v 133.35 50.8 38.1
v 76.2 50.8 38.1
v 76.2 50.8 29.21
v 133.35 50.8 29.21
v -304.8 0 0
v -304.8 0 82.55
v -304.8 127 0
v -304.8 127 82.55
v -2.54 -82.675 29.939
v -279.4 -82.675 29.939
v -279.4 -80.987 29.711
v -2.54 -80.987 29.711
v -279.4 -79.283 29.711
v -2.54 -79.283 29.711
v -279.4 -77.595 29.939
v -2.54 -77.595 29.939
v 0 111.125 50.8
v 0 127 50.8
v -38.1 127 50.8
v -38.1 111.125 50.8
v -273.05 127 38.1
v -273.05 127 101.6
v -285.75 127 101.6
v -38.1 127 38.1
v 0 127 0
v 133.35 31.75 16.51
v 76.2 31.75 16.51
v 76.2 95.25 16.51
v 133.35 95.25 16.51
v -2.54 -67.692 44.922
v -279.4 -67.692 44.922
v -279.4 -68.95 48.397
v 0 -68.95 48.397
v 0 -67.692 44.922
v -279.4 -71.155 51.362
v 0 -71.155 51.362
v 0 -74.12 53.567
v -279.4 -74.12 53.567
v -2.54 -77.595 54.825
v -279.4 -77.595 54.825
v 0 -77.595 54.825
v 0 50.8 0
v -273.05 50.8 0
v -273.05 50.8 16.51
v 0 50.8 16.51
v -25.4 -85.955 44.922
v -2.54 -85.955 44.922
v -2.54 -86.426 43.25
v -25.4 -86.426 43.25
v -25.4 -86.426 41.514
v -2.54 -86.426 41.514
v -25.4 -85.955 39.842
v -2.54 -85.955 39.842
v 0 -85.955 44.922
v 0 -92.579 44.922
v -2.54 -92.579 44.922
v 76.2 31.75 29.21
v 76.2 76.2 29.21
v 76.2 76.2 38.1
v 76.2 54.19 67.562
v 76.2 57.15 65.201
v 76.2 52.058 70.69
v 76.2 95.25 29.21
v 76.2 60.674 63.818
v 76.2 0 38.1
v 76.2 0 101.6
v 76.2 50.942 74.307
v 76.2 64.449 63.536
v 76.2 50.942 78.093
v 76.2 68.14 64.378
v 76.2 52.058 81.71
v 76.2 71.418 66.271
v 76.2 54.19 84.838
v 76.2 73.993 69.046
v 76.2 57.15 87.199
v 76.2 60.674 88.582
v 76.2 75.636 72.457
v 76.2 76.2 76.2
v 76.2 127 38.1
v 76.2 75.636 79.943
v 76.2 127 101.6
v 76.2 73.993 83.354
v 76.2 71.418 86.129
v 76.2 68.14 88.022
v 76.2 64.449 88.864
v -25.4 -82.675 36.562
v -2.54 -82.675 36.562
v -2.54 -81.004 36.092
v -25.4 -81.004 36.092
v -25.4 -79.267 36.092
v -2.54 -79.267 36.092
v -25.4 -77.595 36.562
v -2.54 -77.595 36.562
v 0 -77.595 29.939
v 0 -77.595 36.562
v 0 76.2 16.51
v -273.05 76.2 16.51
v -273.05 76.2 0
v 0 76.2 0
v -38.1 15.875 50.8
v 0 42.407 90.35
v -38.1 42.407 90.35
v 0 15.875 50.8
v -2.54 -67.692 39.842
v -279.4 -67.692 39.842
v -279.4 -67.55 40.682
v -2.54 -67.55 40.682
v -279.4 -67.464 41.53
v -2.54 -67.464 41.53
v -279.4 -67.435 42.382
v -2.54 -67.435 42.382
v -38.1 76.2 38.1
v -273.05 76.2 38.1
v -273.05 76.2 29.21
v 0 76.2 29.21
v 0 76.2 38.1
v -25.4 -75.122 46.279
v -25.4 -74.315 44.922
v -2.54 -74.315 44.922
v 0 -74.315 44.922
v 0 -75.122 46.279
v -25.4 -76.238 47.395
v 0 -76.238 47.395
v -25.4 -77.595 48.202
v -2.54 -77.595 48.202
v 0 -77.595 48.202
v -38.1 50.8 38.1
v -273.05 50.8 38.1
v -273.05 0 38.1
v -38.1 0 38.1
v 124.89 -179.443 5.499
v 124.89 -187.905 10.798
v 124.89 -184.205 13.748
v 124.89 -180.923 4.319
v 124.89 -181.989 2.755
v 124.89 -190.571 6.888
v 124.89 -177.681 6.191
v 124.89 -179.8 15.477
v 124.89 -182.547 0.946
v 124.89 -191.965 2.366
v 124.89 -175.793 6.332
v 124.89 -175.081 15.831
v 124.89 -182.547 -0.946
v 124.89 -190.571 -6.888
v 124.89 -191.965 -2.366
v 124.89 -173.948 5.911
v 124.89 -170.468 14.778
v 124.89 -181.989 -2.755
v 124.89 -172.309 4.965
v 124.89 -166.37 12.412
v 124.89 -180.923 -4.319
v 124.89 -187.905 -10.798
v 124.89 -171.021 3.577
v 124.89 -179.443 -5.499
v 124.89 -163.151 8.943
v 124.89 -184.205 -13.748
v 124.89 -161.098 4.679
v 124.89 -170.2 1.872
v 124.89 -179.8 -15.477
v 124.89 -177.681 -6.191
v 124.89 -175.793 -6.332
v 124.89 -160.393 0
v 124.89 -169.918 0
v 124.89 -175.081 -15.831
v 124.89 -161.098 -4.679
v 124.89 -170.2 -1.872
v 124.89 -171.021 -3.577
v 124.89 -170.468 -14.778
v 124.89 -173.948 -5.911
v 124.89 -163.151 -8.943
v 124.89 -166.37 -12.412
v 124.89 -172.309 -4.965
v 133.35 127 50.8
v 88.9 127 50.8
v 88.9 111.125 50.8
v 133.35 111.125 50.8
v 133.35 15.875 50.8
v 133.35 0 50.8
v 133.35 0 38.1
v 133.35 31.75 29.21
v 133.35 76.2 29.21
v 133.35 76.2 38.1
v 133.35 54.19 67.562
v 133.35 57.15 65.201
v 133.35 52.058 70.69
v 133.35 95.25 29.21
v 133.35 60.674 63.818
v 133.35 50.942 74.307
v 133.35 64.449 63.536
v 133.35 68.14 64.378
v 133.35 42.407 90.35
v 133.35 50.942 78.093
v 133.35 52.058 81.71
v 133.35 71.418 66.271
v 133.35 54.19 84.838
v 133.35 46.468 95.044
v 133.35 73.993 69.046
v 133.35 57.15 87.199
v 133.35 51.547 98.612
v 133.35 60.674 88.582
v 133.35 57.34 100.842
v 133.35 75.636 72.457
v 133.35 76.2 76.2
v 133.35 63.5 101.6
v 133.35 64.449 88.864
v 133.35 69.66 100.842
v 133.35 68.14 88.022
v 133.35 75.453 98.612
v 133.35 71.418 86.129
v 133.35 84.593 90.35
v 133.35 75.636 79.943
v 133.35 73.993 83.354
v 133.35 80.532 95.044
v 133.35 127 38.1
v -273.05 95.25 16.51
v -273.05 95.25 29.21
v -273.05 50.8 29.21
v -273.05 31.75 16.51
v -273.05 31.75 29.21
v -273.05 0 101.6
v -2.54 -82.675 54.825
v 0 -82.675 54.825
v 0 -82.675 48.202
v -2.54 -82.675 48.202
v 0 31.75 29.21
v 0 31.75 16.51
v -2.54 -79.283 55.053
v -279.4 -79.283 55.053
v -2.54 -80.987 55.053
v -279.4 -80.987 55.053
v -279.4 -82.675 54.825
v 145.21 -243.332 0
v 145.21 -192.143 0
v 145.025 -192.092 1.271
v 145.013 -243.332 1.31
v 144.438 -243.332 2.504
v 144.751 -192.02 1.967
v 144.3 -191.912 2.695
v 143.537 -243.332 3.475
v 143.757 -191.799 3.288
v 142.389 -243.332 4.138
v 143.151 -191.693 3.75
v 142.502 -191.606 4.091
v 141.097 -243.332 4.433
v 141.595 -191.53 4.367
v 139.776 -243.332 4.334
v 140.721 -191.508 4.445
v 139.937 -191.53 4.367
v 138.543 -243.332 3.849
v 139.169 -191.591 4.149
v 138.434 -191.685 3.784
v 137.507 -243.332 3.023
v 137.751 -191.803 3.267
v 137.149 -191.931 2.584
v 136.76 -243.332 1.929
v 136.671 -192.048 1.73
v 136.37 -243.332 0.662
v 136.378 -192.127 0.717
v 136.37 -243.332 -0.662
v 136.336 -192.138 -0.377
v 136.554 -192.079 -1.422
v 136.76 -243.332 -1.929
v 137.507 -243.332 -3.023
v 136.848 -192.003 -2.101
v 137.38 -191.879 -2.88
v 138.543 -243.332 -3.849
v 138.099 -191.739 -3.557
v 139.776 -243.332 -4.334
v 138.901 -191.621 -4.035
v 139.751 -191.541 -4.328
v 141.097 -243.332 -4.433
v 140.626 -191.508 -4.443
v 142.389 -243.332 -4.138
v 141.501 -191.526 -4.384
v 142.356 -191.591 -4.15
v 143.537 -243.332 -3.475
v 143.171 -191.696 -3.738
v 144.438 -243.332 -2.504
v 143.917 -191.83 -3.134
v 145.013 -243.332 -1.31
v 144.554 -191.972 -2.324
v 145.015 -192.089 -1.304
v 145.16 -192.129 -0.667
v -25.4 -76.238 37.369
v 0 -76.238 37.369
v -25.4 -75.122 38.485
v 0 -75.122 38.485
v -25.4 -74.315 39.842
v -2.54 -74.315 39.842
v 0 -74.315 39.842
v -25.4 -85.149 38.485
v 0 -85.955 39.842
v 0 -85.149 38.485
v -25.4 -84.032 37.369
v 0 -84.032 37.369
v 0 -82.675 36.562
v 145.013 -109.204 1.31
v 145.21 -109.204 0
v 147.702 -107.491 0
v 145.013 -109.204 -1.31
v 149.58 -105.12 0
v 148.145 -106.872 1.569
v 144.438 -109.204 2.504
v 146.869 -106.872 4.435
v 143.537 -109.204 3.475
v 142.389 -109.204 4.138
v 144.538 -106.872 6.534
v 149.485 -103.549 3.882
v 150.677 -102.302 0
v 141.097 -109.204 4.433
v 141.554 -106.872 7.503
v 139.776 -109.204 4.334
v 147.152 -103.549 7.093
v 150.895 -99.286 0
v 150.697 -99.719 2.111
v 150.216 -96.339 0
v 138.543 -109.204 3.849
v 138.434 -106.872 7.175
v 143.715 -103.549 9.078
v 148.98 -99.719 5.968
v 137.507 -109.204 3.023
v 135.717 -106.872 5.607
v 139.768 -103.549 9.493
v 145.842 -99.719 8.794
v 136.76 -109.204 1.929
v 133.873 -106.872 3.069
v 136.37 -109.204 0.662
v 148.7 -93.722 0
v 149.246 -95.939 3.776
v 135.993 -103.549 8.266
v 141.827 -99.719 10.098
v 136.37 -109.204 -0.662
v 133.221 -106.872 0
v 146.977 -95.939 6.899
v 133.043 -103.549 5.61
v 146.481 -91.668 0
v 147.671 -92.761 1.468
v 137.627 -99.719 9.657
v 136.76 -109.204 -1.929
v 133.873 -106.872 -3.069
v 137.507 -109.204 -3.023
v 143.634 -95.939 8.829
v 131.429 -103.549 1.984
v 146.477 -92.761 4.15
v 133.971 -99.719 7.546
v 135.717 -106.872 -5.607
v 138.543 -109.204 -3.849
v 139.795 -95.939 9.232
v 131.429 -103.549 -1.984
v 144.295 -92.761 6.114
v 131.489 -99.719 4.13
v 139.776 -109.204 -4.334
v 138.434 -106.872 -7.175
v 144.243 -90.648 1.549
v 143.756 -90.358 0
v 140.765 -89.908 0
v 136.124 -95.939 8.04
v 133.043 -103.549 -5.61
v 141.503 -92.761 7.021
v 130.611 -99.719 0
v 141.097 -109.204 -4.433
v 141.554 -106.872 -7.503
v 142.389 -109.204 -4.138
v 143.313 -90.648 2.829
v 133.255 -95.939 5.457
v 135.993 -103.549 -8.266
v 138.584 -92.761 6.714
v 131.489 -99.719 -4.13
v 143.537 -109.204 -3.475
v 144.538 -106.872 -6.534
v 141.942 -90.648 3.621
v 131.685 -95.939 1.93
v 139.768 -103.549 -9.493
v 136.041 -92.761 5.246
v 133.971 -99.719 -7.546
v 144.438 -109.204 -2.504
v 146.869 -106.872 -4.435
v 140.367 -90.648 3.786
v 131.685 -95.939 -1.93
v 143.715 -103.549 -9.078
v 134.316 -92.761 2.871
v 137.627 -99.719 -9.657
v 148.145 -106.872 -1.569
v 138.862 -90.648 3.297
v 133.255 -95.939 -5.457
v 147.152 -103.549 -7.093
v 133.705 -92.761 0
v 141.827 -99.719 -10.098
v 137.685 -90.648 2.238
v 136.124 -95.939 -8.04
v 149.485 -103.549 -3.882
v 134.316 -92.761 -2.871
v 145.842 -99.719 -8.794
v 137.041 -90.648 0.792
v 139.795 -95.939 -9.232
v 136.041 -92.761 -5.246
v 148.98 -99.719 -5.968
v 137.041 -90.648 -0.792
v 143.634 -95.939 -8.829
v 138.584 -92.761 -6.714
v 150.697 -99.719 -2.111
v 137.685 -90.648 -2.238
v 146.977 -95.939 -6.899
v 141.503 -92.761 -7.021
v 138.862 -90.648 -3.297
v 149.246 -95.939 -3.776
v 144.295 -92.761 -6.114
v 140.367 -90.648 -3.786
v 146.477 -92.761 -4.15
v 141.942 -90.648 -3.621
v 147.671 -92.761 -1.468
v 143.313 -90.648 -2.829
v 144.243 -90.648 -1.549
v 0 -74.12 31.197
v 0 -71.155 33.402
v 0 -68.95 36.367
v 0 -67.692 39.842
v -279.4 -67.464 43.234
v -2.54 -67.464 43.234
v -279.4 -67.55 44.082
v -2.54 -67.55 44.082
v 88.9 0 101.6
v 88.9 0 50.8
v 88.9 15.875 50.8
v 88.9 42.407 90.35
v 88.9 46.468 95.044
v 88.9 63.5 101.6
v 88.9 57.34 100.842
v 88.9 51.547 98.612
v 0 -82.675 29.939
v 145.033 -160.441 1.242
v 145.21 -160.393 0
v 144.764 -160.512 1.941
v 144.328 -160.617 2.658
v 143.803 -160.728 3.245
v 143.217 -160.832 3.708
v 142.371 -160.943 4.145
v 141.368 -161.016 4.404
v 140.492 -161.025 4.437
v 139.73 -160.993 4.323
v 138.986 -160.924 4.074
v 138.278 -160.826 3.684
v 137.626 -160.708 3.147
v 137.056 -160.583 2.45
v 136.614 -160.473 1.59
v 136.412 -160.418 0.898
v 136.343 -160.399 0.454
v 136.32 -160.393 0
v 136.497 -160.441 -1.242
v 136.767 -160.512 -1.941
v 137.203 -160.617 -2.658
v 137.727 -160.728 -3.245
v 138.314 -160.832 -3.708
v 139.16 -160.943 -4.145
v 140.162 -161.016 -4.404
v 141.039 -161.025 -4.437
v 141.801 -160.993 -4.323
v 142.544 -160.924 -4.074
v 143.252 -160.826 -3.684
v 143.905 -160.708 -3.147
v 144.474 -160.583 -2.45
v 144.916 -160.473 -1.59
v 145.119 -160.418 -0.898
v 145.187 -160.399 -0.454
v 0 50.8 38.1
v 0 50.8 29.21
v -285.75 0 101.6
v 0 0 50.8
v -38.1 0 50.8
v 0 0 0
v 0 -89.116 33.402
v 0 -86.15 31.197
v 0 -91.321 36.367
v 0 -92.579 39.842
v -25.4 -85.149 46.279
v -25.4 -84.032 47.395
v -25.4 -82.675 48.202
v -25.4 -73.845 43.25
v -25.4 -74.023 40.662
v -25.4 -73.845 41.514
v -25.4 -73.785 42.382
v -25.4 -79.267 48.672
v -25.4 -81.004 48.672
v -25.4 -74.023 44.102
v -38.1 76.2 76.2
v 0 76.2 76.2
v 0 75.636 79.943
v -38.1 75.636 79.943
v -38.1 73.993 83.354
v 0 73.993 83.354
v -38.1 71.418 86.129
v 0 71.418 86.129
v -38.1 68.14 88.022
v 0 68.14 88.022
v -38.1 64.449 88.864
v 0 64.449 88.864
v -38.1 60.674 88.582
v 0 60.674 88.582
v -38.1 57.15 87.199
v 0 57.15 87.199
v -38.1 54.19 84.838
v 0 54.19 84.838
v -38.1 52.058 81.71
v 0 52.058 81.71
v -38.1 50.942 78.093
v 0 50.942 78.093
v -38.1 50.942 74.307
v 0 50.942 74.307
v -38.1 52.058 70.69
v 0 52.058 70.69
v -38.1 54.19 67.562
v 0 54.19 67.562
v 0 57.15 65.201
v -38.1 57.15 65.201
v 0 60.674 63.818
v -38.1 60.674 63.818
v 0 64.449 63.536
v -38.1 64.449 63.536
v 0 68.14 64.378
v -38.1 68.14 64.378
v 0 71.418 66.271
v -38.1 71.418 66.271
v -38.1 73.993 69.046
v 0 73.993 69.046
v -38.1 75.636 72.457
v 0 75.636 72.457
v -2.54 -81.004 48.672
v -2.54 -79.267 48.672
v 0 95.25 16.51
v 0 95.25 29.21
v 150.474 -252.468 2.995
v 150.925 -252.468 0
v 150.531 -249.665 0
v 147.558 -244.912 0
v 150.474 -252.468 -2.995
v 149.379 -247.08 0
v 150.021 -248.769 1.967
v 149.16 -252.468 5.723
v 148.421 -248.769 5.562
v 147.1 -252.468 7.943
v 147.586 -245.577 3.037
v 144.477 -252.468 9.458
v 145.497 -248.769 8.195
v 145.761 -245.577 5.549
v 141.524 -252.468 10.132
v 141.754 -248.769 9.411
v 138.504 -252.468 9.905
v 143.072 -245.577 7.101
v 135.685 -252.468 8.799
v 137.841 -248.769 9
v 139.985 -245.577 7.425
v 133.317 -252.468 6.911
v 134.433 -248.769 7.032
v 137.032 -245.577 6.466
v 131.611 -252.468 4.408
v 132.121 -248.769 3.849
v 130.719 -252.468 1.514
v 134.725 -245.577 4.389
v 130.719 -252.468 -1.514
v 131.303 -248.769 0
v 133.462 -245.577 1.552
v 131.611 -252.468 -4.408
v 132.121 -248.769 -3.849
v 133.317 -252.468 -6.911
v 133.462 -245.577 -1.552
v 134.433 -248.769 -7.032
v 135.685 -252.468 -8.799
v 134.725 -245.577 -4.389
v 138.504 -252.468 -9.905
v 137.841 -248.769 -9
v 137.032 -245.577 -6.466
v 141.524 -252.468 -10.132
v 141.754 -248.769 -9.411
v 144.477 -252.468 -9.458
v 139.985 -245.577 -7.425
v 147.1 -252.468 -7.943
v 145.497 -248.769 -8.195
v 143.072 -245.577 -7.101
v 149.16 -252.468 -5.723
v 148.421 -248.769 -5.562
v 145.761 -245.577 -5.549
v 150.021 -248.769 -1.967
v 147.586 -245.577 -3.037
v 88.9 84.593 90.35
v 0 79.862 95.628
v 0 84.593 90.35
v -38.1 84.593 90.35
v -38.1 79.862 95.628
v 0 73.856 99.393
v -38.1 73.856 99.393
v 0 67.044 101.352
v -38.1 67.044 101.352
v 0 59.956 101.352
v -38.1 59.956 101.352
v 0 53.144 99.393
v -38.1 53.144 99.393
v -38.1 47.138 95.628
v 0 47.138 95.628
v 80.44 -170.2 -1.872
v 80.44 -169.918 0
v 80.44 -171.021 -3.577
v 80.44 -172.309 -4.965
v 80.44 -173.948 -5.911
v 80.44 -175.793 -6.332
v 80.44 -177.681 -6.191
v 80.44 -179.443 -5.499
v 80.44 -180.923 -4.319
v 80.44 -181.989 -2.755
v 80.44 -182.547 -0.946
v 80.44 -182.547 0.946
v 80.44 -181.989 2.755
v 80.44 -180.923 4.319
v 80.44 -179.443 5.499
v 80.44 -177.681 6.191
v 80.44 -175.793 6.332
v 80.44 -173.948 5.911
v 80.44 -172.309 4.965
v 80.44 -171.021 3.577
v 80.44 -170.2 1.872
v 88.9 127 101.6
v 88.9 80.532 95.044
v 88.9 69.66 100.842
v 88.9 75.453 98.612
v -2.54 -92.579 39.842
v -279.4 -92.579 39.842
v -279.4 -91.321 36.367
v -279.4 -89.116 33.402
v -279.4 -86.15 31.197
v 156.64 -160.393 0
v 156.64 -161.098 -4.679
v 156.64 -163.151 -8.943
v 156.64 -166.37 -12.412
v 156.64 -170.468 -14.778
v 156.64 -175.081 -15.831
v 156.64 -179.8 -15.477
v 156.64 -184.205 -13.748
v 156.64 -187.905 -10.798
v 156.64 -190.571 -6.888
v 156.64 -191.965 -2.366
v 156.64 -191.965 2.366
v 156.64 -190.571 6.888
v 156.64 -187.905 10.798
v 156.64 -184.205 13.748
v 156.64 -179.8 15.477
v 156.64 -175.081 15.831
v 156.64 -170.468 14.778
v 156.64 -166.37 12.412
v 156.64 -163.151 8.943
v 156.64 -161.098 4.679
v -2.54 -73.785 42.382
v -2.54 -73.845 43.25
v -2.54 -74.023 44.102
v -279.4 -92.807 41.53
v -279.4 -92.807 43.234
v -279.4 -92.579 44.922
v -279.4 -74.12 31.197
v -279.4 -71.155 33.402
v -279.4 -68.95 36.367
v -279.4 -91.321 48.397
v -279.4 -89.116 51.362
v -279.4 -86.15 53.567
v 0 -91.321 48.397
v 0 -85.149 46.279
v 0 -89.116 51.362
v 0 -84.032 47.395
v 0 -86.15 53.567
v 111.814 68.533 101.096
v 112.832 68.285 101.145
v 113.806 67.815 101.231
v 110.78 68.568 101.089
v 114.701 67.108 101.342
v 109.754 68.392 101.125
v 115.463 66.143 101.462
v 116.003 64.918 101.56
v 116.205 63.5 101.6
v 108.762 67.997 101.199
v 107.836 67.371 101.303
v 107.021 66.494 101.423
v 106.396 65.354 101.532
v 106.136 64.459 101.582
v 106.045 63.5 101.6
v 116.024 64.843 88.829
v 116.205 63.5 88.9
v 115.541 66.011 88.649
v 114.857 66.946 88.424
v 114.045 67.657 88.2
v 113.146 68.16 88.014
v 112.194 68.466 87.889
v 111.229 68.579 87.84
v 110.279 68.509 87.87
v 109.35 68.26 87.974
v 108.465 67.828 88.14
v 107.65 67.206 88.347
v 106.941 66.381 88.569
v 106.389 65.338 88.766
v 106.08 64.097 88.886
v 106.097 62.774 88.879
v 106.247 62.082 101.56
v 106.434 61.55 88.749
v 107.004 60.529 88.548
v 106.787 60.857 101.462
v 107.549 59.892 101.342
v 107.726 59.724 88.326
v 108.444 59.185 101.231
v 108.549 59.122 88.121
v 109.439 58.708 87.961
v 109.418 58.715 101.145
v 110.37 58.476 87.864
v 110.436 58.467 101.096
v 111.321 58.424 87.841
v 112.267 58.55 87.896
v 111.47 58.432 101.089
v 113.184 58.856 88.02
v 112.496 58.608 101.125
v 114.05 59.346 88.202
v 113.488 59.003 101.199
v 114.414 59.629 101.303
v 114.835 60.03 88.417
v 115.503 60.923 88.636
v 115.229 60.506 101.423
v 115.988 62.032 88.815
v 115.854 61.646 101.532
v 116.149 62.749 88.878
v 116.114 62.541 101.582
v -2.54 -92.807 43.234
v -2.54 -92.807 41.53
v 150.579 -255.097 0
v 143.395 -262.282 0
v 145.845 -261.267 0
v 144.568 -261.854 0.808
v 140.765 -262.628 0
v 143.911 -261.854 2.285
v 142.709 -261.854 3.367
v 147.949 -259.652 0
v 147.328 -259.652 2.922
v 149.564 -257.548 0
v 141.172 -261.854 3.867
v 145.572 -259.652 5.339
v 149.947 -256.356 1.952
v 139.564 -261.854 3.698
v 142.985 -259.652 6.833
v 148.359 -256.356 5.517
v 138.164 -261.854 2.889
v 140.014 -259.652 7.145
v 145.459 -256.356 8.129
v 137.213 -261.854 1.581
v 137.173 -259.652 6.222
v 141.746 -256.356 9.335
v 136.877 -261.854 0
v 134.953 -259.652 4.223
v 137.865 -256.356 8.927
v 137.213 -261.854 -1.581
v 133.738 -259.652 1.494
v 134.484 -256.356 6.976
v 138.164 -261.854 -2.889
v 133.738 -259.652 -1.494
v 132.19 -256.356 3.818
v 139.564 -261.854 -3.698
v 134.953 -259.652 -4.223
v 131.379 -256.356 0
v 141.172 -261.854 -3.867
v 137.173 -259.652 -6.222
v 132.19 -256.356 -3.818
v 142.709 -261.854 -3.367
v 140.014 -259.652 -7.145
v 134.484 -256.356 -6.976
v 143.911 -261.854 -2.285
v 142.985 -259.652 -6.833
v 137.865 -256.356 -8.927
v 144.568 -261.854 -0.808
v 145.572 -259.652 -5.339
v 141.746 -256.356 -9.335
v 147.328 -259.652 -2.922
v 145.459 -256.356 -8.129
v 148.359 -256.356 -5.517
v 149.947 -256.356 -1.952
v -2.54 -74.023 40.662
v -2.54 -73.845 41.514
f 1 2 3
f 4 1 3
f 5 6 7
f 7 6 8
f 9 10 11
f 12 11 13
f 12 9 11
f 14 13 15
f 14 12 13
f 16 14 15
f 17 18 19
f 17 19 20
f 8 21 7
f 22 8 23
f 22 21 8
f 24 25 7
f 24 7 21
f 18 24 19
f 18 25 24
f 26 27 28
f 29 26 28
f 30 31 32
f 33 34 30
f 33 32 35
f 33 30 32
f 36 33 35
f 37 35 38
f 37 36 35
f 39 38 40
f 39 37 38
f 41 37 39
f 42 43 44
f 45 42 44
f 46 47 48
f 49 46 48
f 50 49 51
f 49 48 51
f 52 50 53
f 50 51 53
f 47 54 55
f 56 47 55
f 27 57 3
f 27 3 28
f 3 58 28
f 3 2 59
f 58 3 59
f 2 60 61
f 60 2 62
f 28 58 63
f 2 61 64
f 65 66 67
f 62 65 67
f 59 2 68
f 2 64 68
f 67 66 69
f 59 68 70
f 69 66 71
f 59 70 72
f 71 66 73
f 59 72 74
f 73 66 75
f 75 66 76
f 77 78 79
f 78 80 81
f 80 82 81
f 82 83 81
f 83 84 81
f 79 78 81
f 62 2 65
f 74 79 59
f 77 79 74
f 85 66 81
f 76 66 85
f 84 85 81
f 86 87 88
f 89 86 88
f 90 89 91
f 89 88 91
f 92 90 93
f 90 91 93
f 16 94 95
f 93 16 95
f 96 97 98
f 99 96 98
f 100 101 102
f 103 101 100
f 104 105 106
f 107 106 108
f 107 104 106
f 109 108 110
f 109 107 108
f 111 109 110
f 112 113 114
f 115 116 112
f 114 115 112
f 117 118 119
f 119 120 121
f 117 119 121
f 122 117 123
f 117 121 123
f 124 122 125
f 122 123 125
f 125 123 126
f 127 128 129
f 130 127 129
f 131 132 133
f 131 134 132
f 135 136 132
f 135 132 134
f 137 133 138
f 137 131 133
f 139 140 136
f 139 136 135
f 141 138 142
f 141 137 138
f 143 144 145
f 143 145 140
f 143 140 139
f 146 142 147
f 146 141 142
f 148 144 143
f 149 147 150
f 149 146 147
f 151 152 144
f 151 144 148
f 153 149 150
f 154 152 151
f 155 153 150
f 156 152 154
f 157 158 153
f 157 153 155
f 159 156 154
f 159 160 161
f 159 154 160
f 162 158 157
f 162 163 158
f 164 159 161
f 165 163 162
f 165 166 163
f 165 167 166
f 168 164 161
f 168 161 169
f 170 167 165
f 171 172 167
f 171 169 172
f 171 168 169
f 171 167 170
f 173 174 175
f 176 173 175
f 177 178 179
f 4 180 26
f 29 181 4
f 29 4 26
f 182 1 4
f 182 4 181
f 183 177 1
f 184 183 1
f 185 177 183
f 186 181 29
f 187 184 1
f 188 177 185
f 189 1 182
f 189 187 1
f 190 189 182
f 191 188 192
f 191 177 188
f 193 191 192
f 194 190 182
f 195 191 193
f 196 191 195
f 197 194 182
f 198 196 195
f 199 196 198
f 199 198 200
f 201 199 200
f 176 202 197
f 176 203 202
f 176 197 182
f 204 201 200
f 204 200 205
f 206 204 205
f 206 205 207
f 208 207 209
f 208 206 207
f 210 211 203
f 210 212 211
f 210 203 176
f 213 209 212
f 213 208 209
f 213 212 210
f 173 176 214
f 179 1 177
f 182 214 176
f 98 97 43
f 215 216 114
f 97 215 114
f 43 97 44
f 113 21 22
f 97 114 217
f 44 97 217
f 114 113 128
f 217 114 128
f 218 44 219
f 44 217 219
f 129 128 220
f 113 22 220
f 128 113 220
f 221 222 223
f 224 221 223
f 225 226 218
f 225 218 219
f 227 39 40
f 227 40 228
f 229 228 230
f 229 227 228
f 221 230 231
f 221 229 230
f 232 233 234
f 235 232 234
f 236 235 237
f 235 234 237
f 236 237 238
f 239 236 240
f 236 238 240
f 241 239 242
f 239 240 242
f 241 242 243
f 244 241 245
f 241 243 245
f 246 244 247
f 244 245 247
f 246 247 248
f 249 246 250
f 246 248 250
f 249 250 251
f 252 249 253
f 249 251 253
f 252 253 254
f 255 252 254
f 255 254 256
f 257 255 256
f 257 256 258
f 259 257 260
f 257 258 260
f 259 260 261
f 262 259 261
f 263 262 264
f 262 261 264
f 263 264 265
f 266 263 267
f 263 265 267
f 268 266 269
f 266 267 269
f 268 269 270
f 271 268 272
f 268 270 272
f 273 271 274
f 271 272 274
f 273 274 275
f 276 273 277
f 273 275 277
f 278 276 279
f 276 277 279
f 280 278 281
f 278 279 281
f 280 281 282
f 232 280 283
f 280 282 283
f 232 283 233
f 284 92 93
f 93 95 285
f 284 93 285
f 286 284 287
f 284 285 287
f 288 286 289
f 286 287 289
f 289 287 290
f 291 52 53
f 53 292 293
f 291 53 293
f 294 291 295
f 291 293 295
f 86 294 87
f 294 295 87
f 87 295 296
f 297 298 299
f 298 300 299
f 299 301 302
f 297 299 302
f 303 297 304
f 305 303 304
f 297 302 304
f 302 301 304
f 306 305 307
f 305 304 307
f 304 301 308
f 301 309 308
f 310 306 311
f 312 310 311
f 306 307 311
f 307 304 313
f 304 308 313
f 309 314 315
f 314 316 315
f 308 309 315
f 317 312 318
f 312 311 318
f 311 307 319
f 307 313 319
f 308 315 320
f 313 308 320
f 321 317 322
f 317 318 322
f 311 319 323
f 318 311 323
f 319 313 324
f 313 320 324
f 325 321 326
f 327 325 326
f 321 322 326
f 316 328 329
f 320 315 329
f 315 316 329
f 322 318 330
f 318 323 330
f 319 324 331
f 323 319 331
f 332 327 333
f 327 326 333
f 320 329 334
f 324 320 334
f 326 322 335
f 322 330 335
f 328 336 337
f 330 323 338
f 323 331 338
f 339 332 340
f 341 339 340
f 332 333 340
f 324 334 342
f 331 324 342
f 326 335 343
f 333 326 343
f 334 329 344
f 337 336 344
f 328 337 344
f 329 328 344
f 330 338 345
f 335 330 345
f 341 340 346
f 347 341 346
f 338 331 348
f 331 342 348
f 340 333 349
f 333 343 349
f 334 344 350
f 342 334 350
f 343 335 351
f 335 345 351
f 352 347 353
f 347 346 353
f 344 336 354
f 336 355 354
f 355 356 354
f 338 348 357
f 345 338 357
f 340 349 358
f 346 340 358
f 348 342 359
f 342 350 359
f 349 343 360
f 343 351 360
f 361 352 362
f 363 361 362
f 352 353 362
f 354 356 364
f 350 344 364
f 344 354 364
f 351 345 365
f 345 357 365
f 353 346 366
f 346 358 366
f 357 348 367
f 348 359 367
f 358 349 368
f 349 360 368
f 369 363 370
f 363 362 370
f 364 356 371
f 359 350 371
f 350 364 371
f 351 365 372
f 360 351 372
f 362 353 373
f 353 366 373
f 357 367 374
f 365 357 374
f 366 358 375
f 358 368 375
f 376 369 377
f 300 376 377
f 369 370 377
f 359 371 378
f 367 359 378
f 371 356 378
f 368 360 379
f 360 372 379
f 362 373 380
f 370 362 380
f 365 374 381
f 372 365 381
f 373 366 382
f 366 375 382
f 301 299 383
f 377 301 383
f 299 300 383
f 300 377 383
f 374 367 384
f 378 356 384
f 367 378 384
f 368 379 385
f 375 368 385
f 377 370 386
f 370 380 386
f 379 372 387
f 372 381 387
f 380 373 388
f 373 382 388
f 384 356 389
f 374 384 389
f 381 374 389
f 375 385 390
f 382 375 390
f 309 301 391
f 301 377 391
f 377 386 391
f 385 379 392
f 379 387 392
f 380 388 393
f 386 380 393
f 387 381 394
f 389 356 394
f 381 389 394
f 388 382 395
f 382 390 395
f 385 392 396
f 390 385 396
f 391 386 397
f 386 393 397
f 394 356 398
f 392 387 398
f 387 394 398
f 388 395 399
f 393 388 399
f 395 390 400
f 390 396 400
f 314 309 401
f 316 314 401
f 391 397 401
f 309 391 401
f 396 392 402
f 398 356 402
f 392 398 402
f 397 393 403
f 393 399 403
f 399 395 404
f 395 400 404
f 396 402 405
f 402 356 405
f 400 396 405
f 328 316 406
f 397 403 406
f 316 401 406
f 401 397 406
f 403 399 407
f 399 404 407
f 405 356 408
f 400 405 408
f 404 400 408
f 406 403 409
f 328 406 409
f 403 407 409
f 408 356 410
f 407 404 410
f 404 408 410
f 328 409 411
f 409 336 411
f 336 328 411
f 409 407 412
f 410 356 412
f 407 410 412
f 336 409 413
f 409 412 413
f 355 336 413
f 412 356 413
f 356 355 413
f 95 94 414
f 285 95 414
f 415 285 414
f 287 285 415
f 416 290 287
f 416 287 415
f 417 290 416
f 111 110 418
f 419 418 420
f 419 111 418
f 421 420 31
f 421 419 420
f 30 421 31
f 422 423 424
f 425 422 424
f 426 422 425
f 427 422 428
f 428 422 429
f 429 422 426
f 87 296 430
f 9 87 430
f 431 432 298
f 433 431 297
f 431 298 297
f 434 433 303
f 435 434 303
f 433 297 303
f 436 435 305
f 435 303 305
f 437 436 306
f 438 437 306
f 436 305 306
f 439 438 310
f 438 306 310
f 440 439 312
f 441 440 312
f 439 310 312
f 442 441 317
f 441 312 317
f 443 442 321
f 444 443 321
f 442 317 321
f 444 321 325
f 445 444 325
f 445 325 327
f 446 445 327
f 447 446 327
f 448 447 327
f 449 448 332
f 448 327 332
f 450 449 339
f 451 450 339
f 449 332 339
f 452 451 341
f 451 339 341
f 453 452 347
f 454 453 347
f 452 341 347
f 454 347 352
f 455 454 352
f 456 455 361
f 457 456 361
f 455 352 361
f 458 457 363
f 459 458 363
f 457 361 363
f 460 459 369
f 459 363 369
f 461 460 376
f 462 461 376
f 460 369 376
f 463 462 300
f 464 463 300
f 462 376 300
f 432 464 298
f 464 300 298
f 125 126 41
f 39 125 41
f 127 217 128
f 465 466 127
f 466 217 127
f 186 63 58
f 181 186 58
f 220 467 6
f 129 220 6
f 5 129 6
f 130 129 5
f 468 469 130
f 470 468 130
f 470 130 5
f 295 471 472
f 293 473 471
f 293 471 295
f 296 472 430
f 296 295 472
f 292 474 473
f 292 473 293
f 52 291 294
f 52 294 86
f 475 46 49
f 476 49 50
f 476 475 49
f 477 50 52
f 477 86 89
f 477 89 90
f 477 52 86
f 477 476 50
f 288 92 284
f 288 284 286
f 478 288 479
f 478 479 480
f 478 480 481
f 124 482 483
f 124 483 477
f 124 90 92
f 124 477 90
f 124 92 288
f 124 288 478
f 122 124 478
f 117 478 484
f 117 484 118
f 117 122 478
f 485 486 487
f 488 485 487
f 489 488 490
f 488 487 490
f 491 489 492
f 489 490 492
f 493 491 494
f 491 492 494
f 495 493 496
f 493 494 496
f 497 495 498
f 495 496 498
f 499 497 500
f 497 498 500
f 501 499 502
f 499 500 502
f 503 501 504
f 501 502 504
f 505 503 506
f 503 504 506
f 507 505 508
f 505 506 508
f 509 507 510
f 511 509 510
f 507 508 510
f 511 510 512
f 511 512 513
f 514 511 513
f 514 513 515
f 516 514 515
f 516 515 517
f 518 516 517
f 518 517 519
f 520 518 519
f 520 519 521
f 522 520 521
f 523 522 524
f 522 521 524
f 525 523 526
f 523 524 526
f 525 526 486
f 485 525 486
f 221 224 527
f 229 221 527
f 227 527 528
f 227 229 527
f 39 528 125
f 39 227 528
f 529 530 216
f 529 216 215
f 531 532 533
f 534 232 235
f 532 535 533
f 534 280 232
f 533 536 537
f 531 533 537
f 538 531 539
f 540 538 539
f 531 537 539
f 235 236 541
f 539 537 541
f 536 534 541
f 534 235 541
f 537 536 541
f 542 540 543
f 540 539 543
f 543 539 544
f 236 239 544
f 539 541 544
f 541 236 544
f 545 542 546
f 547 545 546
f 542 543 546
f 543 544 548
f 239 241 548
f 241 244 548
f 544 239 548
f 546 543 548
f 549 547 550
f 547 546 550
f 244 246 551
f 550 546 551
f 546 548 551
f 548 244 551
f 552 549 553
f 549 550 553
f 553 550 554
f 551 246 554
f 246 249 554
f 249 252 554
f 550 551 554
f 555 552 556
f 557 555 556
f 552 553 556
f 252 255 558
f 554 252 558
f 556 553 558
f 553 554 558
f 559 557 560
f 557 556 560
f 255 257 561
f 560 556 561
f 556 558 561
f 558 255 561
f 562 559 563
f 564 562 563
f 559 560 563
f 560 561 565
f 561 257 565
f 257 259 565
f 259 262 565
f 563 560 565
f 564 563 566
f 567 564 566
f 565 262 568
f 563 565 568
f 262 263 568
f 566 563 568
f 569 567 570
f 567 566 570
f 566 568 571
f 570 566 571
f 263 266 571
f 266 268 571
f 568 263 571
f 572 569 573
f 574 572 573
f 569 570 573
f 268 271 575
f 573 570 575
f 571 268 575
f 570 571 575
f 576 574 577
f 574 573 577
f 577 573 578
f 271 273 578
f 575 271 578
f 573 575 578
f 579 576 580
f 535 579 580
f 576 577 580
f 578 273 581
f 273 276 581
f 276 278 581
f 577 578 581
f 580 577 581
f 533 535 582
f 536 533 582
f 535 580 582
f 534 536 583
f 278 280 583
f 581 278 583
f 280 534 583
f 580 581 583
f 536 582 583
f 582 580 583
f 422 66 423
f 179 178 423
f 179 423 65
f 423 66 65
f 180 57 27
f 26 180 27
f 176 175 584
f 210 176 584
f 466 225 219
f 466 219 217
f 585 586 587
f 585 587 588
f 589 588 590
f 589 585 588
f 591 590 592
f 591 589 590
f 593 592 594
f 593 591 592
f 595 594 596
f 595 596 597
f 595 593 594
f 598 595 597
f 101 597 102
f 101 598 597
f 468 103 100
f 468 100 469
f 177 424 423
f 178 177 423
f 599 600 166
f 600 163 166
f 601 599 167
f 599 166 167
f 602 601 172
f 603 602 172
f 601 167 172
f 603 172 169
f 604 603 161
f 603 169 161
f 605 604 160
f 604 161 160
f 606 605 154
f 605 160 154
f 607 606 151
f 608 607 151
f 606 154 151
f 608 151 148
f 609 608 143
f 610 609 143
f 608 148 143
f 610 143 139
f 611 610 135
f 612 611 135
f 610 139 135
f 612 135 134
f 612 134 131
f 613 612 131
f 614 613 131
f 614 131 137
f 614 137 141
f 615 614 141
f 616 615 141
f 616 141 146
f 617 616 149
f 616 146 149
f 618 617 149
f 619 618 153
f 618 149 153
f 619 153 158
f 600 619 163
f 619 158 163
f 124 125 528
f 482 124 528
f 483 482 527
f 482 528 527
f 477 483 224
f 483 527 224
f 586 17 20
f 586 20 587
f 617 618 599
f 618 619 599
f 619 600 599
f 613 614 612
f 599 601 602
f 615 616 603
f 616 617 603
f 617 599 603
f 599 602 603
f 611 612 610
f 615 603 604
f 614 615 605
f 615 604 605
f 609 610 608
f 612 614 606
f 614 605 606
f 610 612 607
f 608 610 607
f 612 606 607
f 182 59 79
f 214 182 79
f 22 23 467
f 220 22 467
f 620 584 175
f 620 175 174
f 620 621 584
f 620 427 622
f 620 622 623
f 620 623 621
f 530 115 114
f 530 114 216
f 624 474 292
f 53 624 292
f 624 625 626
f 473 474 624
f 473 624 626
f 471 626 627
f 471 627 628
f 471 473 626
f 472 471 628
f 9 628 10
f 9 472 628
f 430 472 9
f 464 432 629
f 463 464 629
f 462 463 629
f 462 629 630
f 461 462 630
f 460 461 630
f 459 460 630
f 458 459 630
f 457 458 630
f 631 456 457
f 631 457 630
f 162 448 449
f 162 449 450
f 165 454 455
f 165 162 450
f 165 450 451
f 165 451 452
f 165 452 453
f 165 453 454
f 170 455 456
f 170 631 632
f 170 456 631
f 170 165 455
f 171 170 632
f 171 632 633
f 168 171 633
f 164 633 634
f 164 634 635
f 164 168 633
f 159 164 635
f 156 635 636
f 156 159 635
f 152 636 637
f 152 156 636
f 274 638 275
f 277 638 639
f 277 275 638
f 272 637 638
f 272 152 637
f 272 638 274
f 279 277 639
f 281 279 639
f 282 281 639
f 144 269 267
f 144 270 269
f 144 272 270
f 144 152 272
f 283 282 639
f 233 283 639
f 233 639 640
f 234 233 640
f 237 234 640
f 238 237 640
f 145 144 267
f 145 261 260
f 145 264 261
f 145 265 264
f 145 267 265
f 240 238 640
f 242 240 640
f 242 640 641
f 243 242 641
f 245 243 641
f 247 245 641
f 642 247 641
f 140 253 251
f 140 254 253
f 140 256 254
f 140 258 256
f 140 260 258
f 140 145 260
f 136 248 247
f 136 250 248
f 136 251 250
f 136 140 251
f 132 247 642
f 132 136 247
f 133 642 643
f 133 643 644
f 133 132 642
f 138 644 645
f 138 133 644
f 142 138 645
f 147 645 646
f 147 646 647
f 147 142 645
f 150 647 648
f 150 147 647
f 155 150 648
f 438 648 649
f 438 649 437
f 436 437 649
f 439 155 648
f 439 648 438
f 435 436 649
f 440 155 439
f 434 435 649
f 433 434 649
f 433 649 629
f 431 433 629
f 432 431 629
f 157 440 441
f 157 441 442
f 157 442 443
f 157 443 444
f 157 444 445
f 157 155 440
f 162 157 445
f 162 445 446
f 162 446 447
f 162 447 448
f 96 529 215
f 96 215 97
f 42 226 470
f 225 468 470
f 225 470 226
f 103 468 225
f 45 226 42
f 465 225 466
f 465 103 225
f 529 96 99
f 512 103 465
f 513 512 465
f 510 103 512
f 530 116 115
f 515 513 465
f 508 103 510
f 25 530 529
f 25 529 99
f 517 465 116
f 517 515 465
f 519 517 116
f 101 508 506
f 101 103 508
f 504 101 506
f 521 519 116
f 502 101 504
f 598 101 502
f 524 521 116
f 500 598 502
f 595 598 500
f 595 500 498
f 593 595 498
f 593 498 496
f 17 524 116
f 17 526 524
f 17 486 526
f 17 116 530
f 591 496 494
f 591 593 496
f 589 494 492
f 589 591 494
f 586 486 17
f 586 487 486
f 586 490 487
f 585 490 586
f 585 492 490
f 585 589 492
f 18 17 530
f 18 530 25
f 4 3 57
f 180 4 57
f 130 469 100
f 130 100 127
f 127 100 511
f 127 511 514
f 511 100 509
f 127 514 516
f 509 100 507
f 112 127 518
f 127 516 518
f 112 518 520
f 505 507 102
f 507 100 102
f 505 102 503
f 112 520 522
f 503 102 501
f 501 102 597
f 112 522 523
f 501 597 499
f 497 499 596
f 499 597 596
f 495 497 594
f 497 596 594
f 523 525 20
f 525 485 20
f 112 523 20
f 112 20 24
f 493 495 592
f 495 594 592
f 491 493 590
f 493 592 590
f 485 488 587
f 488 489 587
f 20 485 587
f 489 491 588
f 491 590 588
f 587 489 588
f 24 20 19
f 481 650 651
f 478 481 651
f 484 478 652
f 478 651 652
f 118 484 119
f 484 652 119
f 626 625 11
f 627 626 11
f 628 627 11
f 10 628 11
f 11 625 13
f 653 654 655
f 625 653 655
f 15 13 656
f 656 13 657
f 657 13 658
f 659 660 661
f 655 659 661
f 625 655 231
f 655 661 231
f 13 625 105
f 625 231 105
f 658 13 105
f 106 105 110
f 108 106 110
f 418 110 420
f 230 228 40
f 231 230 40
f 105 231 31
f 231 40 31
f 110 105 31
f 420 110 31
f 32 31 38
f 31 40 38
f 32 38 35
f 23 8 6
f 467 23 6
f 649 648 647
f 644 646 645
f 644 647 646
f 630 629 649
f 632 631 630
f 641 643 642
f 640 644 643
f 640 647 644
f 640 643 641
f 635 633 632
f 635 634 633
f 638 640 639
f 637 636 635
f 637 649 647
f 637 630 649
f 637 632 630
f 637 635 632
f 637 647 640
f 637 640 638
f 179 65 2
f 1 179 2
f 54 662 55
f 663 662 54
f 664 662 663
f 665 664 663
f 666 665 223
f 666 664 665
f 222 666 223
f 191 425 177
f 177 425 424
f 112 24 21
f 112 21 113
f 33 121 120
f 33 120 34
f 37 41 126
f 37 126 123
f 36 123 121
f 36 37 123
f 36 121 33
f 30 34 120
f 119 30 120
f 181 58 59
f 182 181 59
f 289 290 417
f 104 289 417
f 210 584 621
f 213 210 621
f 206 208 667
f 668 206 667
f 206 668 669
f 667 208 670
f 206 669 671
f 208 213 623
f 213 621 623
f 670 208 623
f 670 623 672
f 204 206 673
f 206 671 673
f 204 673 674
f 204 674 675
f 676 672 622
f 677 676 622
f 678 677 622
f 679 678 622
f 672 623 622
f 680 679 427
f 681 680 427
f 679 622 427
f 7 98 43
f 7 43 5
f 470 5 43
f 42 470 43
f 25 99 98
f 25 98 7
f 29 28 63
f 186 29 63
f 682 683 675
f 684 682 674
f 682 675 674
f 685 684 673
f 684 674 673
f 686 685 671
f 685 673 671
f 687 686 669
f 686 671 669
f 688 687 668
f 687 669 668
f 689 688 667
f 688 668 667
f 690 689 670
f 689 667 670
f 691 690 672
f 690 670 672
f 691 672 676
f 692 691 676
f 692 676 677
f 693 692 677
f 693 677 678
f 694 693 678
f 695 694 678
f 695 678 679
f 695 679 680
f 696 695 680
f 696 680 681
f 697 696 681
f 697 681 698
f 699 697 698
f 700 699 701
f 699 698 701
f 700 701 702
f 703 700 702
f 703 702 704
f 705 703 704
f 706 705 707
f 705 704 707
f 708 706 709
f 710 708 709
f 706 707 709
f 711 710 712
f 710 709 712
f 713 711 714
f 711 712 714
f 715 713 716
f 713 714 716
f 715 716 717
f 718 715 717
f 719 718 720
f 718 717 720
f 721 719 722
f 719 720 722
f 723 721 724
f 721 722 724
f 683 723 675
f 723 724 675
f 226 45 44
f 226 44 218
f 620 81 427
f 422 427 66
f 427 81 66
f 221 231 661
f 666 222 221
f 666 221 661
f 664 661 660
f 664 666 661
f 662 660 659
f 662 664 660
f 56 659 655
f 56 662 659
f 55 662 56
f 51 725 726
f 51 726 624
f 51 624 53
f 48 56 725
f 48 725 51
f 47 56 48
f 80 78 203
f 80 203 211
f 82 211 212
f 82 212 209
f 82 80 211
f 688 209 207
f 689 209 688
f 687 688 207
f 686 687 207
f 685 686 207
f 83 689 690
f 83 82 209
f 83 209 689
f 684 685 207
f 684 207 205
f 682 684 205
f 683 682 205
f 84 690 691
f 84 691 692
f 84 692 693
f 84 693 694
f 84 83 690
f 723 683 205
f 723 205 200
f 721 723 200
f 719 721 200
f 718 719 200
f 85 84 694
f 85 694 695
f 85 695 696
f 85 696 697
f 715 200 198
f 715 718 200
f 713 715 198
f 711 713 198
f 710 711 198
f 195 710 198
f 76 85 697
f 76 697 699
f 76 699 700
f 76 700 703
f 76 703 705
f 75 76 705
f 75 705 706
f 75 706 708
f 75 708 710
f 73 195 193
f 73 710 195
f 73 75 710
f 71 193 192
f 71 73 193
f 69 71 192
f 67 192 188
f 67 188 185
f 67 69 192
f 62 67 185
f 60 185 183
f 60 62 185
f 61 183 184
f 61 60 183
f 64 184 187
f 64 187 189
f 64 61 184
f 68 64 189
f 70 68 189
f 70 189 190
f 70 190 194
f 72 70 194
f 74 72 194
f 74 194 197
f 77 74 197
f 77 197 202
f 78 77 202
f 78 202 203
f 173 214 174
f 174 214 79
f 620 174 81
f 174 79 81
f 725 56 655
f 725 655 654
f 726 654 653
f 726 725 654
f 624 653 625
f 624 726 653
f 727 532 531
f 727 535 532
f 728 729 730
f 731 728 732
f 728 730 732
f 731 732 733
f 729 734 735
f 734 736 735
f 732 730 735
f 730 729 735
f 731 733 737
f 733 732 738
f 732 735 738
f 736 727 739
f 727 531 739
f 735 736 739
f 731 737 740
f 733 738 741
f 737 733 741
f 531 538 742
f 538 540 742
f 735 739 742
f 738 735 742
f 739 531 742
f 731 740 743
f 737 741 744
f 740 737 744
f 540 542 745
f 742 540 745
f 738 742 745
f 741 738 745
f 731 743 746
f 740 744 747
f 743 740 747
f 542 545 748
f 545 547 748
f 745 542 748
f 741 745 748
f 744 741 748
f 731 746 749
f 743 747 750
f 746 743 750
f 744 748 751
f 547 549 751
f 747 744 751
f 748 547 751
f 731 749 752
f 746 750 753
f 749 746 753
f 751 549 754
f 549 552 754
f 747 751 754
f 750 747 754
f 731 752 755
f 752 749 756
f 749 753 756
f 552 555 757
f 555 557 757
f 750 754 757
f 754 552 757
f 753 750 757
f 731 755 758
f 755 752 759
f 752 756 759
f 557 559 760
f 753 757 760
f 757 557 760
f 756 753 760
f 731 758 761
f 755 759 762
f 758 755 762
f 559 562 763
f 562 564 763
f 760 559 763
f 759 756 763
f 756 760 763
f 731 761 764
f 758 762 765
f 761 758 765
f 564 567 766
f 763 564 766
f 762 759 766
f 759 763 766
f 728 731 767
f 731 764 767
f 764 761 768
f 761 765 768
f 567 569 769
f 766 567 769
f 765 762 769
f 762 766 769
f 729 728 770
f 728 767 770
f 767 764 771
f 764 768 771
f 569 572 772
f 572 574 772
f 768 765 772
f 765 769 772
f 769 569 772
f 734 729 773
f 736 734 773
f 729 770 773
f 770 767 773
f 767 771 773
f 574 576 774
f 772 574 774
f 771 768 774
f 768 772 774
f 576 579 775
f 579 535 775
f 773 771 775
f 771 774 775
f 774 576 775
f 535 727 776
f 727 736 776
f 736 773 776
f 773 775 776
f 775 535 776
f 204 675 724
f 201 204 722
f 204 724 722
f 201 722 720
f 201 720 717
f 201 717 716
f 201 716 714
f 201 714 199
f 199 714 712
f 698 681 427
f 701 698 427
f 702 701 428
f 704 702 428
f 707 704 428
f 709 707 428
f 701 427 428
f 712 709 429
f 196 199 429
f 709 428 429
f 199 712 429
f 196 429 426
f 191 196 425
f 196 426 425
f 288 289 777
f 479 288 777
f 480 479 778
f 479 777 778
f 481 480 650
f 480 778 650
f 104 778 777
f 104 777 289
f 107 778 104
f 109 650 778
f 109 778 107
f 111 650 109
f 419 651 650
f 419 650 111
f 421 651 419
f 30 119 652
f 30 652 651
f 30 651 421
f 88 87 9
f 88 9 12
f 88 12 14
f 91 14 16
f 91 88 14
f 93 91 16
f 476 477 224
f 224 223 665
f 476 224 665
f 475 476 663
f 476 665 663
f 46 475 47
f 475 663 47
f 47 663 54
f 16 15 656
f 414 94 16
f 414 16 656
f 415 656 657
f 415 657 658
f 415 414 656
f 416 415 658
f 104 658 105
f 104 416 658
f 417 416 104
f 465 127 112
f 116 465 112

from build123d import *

# Parameters (mm, degrees)
F0_R      = 12.7
F1_DEPTH  = 38.1
F2_DEPTH  = 304.8
F3_W      = 127
F3_H      = 101.6
F4_DEPTH  = 31.75
F5_SIZE2  = 19.05
F5_SIZE   = 19.05
F7_R      = 12.7
F8_DEPTH  = 57.15
F9_DEPTH  = 12.7
F10_R     = 5.08
F11_DEPTH = 14.7602578338
F13_DEPTH = 279.4
F14_DEPTH = 25.4
F15_DEPTH = 2.54
F16_W     = 4.445
F16_H     = 15.875
F16_W_2   = 11.43
F16_W_3   = 44.45
F16_H_2   = 6.35


with BuildPart() as f1:
    # F0 (on Right) → F1 (new body)
    with BuildSketch(Plane.YZ):
        Polygon((0, 38.1), (0, 0), (50.8, 0), (50.8, 16.51), (31.75, 16.51), (31.75, 29.21), (50.8, 29.21), (50.8, 38.1), align=None)
        Polygon((76.2, 16.51), (76.2, 0), (127, 0), (127, 38.1), (76.2, 38.1), (76.2, 29.21), (95.25, 29.21), (95.25, 16.51), align=None)
        with BuildLine():
            Line((42.4065743945, 90.3501730104), (15.875, 50.8))
            Line((15.875, 50.8), (111.125, 50.8))
            Line((111.125, 50.8), (84.5934256055, 90.3501730104))
            ThreePointArc((84.5934256055, 90.3501730104), (63.5, 101.6), (42.4065743945, 90.3501730104))
        make_face()
        with Locations((63.5, 76.2)):
            Circle(F0_R, mode=Mode.SUBTRACT)
        Polygon((0, 50.8), (0, 38.1), (50.8, 38.1), (76.2, 38.1), (127, 38.1), (127, 50.8), (111.125, 50.8), (15.875, 50.8), align=None)
    extrude(amount=-F1_DEPTH)

    # F0 (on Right) → F2 (join)
    with BuildSketch(Plane.YZ):
        Polygon((76.2, 16.51), (76.2, 0), (127, 0), (127, 38.1), (76.2, 38.1), (76.2, 29.21), (95.25, 29.21), (95.25, 16.51), align=None)
        Polygon((0, 38.1), (0, 0), (50.8, 0), (50.8, 16.51), (31.75, 16.51), (31.75, 29.21), (50.8, 29.21), (50.8, 38.1), align=None)
    extrude(amount=-F2_DEPTH)

    # F3 (on face) → F4 (join)
    with BuildSketch(Plane(origin=(-304.8, 0, 0), x_dir=(0, -1, 0), z_dir=(-1, 0, 0))):
        with Locations((-63.5, 50.8)):
            Rectangle(F3_W, F3_H)
    extrude(amount=-F4_DEPTH)

    # F5
    f5_edges = [f1.edges().sort_by_distance(p)[0] for p in [
        (-304.8, 63.5, 101.6),
    ]]
    chamfer(f5_edges, length=F5_SIZE, length2=F5_SIZE2)


with BuildPart() as f8:
    # F7 (on offset) → F8 (new body)
    with BuildSketch(Plane.YZ.offset(76.2)):
        Polygon((111.125, 50.8), (15.875, 50.8), (0, 50.8), (0, 38.1), (50.8, 38.1), (76.2, 38.1), (127, 38.1), (127, 50.8), align=None)
        with BuildLine():
            Line((42.4065743945, 90.3501730104), (15.875, 50.8))
            Line((15.875, 50.8), (111.125, 50.8))
            Line((111.125, 50.8), (84.5934256055, 90.3501730104))
            ThreePointArc((84.5934256055, 90.3501730104), (75.4529411765, 98.6117647059), (63.5, 101.6))
            ThreePointArc((63.5, 101.6), (51.5470588235, 98.6117647059), (42.4065743945, 90.3501730104))
        make_face()
        with Locations((63.5, 76.2)):
            Circle(F7_R, mode=Mode.SUBTRACT)
        Polygon((76.2, 38.1), (50.8, 38.1), (50.8, 29.21), (31.75, 29.21), (31.75, 16.51), (50.8, 16.51), (76.2, 16.51), (95.25, 16.51), (95.25, 29.21), (76.2, 29.21), align=None)
    extrude(amount=F8_DEPTH)

    # F7 (on offset) → F9 (join)
    with BuildSketch(Plane.YZ.offset(76.2)):
        with BuildLine():
            Line((0, 50.8), (15.875, 50.8))
            Line((15.875, 50.8), (42.4065743945, 90.3501730104))
            ThreePointArc((42.4065743945, 90.3501730104), (51.5470588235, 98.6117647059), (63.5, 101.6))
            Line((63.5, 101.6), (0, 101.6))
            Line((0, 101.6), (0, 50.8))
        make_face()
        with BuildLine():
            Line((84.5934256055, 90.3501730104), (111.125, 50.8))
            Line((111.125, 50.8), (127, 50.8))
            Line((127, 50.8), (127, 101.6))
            Line((127, 101.6), (63.5, 101.6))
            ThreePointArc((63.5, 101.6), (75.4529411765, 98.6117647059), (84.5934256055, 90.3501730104))
        make_face()
    extrude(amount=F9_DEPTH)

    # F10 (on face) → F11 (cut, up to face)
    with BuildSketch(Plane.XY.offset(101.6)):
        with Locations((111.125, 63.5)):
            Circle(F10_R)
    extrude(amount=-F11_DEPTH, mode=Mode.SUBTRACT)


with BuildPart() as f13:
    # F12 (on Right) → F13 (new body)
    with BuildSketch(Plane.YZ):
        with BuildLine():
            ThreePointArc((-74.31538743, 44.9220035141), (-73.9192034755, 43.6793697515), (-73.7852585626, 42.3820035141))
            ThreePointArc((-73.7852585626, 42.3820035141), (-73.9192034755, 41.0846372766), (-74.31538743, 39.8420035141))
            Line((-74.31538743, 39.8420035141), (-67.6918506693, 39.8420035141))
            ThreePointArc((-67.6918506693, 39.8420035141), (-67.4995694194, 41.1055396966), (-67.4352585626, 42.3820035141))
            ThreePointArc((-67.4352585626, 42.3820035141), (-67.4995694194, 43.6584673315), (-67.6918506693, 44.9220035141))
            Line((-67.6918506693, 44.9220035141), (-74.31538743, 44.9220035141))
        make_face()
        with BuildLine():
            ThreePointArc((-77.5952585626, 48.2018746466), (-75.6451305021, 46.8721315746), (-74.31538743, 44.9220035141))
            Line((-74.31538743, 44.9220035141), (-67.6918506693, 44.9220035141))
            ThreePointArc((-67.6918506693, 44.9220035141), (-71.1550024415, 51.3622596351), (-77.5952585626, 54.8254114074))
            Line((-77.5952585626, 54.8254114074), (-77.5952585626, 48.2018746466))
        make_face()
        with BuildLine():
            Line((-67.6918506693, 39.8420035141), (-74.31538743, 39.8420035141))
            ThreePointArc((-74.31538743, 39.8420035141), (-75.6451305021, 37.8918754535), (-77.5952585626, 36.5621323815))
            Line((-77.5952585626, 36.5621323815), (-77.5952585626, 29.9385956207))
            ThreePointArc((-77.5952585626, 29.9385956207), (-71.1550024415, 33.401747393), (-67.6918506693, 39.8420035141))
        make_face()
        with BuildLine():
            ThreePointArc((-82.6752585626, 48.2018746466), (-80.1352585626, 48.7320035141), (-77.5952585626, 48.2018746466))
            Line((-77.5952585626, 48.2018746466), (-77.5952585626, 54.8254114074))
            ThreePointArc((-77.5952585626, 54.8254114074), (-80.1352585626, 55.0820035141), (-82.6752585626, 54.8254114074))
            Line((-82.6752585626, 54.8254114074), (-82.6752585626, 48.2018746466))
        make_face()
        with BuildLine():
            Line((-77.5952585626, 29.9385956207), (-77.5952585626, 36.5621323815))
            ThreePointArc((-77.5952585626, 36.5621323815), (-80.1352585626, 36.0320035141), (-82.6752585626, 36.5621323815))
            Line((-82.6752585626, 36.5621323815), (-82.6752585626, 29.9385956207))
            ThreePointArc((-82.6752585626, 29.9385956207), (-80.1352585626, 29.6820035141), (-77.5952585626, 29.9385956207))
        make_face()
        with BuildLine():
            ThreePointArc((-85.9551296952, 44.9220035141), (-84.6253866231, 46.8721315746), (-82.6752585626, 48.2018746466))
            Line((-82.6752585626, 48.2018746466), (-82.6752585626, 54.8254114074))
            ThreePointArc((-82.6752585626, 54.8254114074), (-89.1155146837, 51.3622596351), (-92.5786664559, 44.9220035141))
            Line((-92.5786664559, 44.9220035141), (-85.9551296952, 44.9220035141))
        make_face()
        with BuildLine():
            Line((-82.6752585626, 29.9385956207), (-82.6752585626, 36.5621323815))
            ThreePointArc((-82.6752585626, 36.5621323815), (-84.6253866231, 37.8918754535), (-85.9551296952, 39.8420035141))
            Line((-85.9551296952, 39.8420035141), (-92.5786664559, 39.8420035141))
            ThreePointArc((-92.5786664559, 39.8420035141), (-89.1155146837, 33.401747393), (-82.6752585626, 29.9385956207))
        make_face()
        with BuildLine():
            ThreePointArc((-85.9551296952, 39.8420035141), (-86.4852585626, 42.3820035141), (-85.9551296952, 44.9220035141))
            Line((-85.9551296952, 44.9220035141), (-92.5786664559, 44.9220035141))
            ThreePointArc((-92.5786664559, 44.9220035141), (-92.8352585626, 42.3820035141), (-92.5786664559, 39.8420035141))
            Line((-92.5786664559, 39.8420035141), (-85.9551296952, 39.8420035141))
        make_face()
        with BuildLine():
            ThreePointArc((-74.31538743, 39.8420035141), (-73.9192034755, 41.0846372766), (-73.7852585626, 42.3820035141))
            ThreePointArc((-73.7852585626, 42.3820035141), (-73.9192034755, 43.6793697515), (-74.31538743, 44.9220035141))
            ThreePointArc((-74.31538743, 44.9220035141), (-75.6451305021, 46.8721315746), (-77.5952585626, 48.2018746466))
            ThreePointArc((-77.5952585626, 48.2018746466), (-80.1352585626, 48.7320035141), (-82.6752585626, 48.2018746466))
            ThreePointArc((-82.6752585626, 48.2018746466), (-84.6253866231, 46.8721315746), (-85.9551296952, 44.9220035141))
            ThreePointArc((-85.9551296952, 44.9220035141), (-86.4852585626, 42.3820035141), (-85.9551296952, 39.8420035141))
            ThreePointArc((-85.9551296952, 39.8420035141), (-84.6253866231, 37.8918754535), (-82.6752585626, 36.5621323815))
            ThreePointArc((-82.6752585626, 36.5621323815), (-80.1352585626, 36.0320035141), (-77.5952585626, 36.5621323815))
            ThreePointArc((-77.5952585626, 36.5621323815), (-75.6451305021, 37.8918754535), (-74.31538743, 39.8420035141))
        make_face()
    extrude(amount=-F13_DEPTH)

    # F12 (on Right) → F14 (cut)
    with BuildSketch(Plane.YZ):
        with BuildLine():
            ThreePointArc((-74.31538743, 39.8420035141), (-73.9192034755, 41.0846372766), (-73.7852585626, 42.3820035141))
            ThreePointArc((-73.7852585626, 42.3820035141), (-73.9192034755, 43.6793697515), (-74.31538743, 44.9220035141))
            ThreePointArc((-74.31538743, 44.9220035141), (-75.6451305021, 46.8721315746), (-77.5952585626, 48.2018746466))
            ThreePointArc((-77.5952585626, 48.2018746466), (-80.1352585626, 48.7320035141), (-82.6752585626, 48.2018746466))
            ThreePointArc((-82.6752585626, 48.2018746466), (-84.6253866231, 46.8721315746), (-85.9551296952, 44.9220035141))
            ThreePointArc((-85.9551296952, 44.9220035141), (-86.4852585626, 42.3820035141), (-85.9551296952, 39.8420035141))
            ThreePointArc((-85.9551296952, 39.8420035141), (-84.6253866231, 37.8918754535), (-82.6752585626, 36.5621323815))
            ThreePointArc((-82.6752585626, 36.5621323815), (-80.1352585626, 36.0320035141), (-77.5952585626, 36.5621323815))
            ThreePointArc((-77.5952585626, 36.5621323815), (-75.6451305021, 37.8918754535), (-74.31538743, 39.8420035141))
        make_face()
    extrude(amount=-F14_DEPTH, mode=Mode.SUBTRACT)

    # F12 (on Right) → F15 (cut)
    with BuildSketch(Plane.YZ):
        with BuildLine():
            ThreePointArc((-82.6752585626, 48.2018746466), (-80.1352585626, 48.7320035141), (-77.5952585626, 48.2018746466))
            Line((-77.5952585626, 48.2018746466), (-77.5952585626, 54.8254114074))
            ThreePointArc((-77.5952585626, 54.8254114074), (-80.1352585626, 55.0820035141), (-82.6752585626, 54.8254114074))
            Line((-82.6752585626, 54.8254114074), (-82.6752585626, 48.2018746466))
        make_face()
        with BuildLine():
            ThreePointArc((-74.31538743, 44.9220035141), (-73.9192034755, 43.6793697515), (-73.7852585626, 42.3820035141))
            ThreePointArc((-73.7852585626, 42.3820035141), (-73.9192034755, 41.0846372766), (-74.31538743, 39.8420035141))
            Line((-74.31538743, 39.8420035141), (-67.6918506693, 39.8420035141))
            ThreePointArc((-67.6918506693, 39.8420035141), (-67.4995694194, 41.1055396966), (-67.4352585626, 42.3820035141))
            ThreePointArc((-67.4352585626, 42.3820035141), (-67.4995694194, 43.6584673315), (-67.6918506693, 44.9220035141))
            Line((-67.6918506693, 44.9220035141), (-74.31538743, 44.9220035141))
        make_face()
        with BuildLine():
            Line((-77.5952585626, 29.9385956207), (-77.5952585626, 36.5621323815))
            ThreePointArc((-77.5952585626, 36.5621323815), (-80.1352585626, 36.0320035141), (-82.6752585626, 36.5621323815))
            Line((-82.6752585626, 36.5621323815), (-82.6752585626, 29.9385956207))
            ThreePointArc((-82.6752585626, 29.9385956207), (-80.1352585626, 29.6820035141), (-77.5952585626, 29.9385956207))
        make_face()
        with BuildLine():
            ThreePointArc((-85.9551296952, 39.8420035141), (-86.4852585626, 42.3820035141), (-85.9551296952, 44.9220035141))
            Line((-85.9551296952, 44.9220035141), (-92.5786664559, 44.9220035141))
            ThreePointArc((-92.5786664559, 44.9220035141), (-92.8352585626, 42.3820035141), (-92.5786664559, 39.8420035141))
            Line((-92.5786664559, 39.8420035141), (-85.9551296952, 39.8420035141))
        make_face()
    extrude(amount=-F15_DEPTH, mode=Mode.SUBTRACT)


with BuildPart() as f17:
    # F16 (on Top) → F17 (revolve)
    with BuildSketch(Plane.XY):
        with BuildLine():
            Line((140.765233001, -100.0677298003), (145.210233001, -100.0677298003))
            Line((145.210233001, -100.0677298003), (145.210233001, -109.2037888522))
            ThreePointArc((145.210233001, -109.2037888522), (149.3787920796, -105.4558834729), (150.925233001, -100.0677298003))
            ThreePointArc((150.925233001, -100.0677298003), (147.9494378978, -92.8835249034), (140.765233001, -89.9077298003))
            Line((140.765233001, -89.9077298003), (140.765233001, -100.0677298003))
        make_face()
        with BuildLine():
            Line((145.210233001, -109.2037888522), (145.210233001, -100.0677298003))
            Line((145.210233001, -100.0677298003), (140.765233001, -100.0677298003))
            Line((140.765233001, -100.0677298003), (140.765233001, -110.2277298003))
            ThreePointArc((140.765233001, -110.2277298003), (143.0459390356, -109.9684358349), (145.210233001, -109.2037888522))
        make_face()
        with BuildLine():
            Line((145.210233001, -160.3927298003), (145.210233001, -109.2037888522))
            ThreePointArc((145.210233001, -109.2037888522), (143.0459390356, -109.9684358349), (140.765233001, -110.2277298003))
            Line((140.765233001, -110.2277298003), (140.765233001, -160.3927298003))
            Line((140.765233001, -160.3927298003), (145.210233001, -160.3927298003))
        make_face()
        with Locations((142.987733001, -168.3302298003)):
            Rectangle(F16_W, F16_H)
        with Locations((142.987733001, -184.2052298003)):
            Rectangle(F16_W, F16_H)
        with BuildLine():
            Line((145.210233001, -243.3316707484), (145.210233001, -192.1427298003))
            Line((145.210233001, -192.1427298003), (140.765233001, -192.1427298003))
            Line((140.765233001, -192.1427298003), (140.765233001, -242.3077298003))
            ThreePointArc((140.765233001, -242.3077298003), (143.0459390356, -242.5670237657), (145.210233001, -243.3316707484))
        make_face()
        with BuildLine():
            Line((145.210233001, -252.4677298003), (145.210233001, -243.3316707484))
            ThreePointArc((145.210233001, -243.3316707484), (143.0459390356, -242.5670237657), (140.765233001, -242.3077298003))
            Line((140.765233001, -242.3077298003), (140.765233001, -252.4677298003))
            Line((140.765233001, -252.4677298003), (145.210233001, -252.4677298003))
        make_face()
        with BuildLine():
            ThreePointArc((150.925233001, -252.4677298003), (149.3787920796, -247.0795761276), (145.210233001, -243.3316707484))
            Line((145.210233001, -243.3316707484), (145.210233001, -252.4677298003))
            Line((145.210233001, -252.4677298003), (140.765233001, -252.4677298003))
            Line((140.765233001, -252.4677298003), (140.765233001, -262.6277298003))
            ThreePointArc((140.765233001, -262.6277298003), (147.9494378978, -259.6519346971), (150.925233001, -252.4677298003))
        make_face()
    revolve(axis=Axis((140.765233001, -176.2677298003, 0), (0, -1, 0)))

    # F16 (on Top) → F18 (revolve)
    with BuildSketch(Plane.XY):
        with Locations((150.925233001, -168.3302298003)):
            Rectangle(F16_W_2, F16_H)
        Polygon((136.320233001, -176.2677298003), (136.320233001, -160.3927298003), (124.890233001, -160.3927298003), (124.890233001, -169.9177298003), (124.890233001, -176.2677298003), align=None)
        with Locations((102.665233001, -173.0927298003)):
            Rectangle(F16_W_3, F16_H_2)
        with Locations((142.987733001, -168.3302298003)):
            Rectangle(F16_W, F16_H)
        with Locations((138.542733001, -168.3302298003)):
            Rectangle(F16_W, F16_H)
    revolve(axis=Axis((118.540233001, -176.2677298003, 0), (-1, 0, 0)))


solid = Compound([f1.part, f8.part, f13.part, f17.part])
